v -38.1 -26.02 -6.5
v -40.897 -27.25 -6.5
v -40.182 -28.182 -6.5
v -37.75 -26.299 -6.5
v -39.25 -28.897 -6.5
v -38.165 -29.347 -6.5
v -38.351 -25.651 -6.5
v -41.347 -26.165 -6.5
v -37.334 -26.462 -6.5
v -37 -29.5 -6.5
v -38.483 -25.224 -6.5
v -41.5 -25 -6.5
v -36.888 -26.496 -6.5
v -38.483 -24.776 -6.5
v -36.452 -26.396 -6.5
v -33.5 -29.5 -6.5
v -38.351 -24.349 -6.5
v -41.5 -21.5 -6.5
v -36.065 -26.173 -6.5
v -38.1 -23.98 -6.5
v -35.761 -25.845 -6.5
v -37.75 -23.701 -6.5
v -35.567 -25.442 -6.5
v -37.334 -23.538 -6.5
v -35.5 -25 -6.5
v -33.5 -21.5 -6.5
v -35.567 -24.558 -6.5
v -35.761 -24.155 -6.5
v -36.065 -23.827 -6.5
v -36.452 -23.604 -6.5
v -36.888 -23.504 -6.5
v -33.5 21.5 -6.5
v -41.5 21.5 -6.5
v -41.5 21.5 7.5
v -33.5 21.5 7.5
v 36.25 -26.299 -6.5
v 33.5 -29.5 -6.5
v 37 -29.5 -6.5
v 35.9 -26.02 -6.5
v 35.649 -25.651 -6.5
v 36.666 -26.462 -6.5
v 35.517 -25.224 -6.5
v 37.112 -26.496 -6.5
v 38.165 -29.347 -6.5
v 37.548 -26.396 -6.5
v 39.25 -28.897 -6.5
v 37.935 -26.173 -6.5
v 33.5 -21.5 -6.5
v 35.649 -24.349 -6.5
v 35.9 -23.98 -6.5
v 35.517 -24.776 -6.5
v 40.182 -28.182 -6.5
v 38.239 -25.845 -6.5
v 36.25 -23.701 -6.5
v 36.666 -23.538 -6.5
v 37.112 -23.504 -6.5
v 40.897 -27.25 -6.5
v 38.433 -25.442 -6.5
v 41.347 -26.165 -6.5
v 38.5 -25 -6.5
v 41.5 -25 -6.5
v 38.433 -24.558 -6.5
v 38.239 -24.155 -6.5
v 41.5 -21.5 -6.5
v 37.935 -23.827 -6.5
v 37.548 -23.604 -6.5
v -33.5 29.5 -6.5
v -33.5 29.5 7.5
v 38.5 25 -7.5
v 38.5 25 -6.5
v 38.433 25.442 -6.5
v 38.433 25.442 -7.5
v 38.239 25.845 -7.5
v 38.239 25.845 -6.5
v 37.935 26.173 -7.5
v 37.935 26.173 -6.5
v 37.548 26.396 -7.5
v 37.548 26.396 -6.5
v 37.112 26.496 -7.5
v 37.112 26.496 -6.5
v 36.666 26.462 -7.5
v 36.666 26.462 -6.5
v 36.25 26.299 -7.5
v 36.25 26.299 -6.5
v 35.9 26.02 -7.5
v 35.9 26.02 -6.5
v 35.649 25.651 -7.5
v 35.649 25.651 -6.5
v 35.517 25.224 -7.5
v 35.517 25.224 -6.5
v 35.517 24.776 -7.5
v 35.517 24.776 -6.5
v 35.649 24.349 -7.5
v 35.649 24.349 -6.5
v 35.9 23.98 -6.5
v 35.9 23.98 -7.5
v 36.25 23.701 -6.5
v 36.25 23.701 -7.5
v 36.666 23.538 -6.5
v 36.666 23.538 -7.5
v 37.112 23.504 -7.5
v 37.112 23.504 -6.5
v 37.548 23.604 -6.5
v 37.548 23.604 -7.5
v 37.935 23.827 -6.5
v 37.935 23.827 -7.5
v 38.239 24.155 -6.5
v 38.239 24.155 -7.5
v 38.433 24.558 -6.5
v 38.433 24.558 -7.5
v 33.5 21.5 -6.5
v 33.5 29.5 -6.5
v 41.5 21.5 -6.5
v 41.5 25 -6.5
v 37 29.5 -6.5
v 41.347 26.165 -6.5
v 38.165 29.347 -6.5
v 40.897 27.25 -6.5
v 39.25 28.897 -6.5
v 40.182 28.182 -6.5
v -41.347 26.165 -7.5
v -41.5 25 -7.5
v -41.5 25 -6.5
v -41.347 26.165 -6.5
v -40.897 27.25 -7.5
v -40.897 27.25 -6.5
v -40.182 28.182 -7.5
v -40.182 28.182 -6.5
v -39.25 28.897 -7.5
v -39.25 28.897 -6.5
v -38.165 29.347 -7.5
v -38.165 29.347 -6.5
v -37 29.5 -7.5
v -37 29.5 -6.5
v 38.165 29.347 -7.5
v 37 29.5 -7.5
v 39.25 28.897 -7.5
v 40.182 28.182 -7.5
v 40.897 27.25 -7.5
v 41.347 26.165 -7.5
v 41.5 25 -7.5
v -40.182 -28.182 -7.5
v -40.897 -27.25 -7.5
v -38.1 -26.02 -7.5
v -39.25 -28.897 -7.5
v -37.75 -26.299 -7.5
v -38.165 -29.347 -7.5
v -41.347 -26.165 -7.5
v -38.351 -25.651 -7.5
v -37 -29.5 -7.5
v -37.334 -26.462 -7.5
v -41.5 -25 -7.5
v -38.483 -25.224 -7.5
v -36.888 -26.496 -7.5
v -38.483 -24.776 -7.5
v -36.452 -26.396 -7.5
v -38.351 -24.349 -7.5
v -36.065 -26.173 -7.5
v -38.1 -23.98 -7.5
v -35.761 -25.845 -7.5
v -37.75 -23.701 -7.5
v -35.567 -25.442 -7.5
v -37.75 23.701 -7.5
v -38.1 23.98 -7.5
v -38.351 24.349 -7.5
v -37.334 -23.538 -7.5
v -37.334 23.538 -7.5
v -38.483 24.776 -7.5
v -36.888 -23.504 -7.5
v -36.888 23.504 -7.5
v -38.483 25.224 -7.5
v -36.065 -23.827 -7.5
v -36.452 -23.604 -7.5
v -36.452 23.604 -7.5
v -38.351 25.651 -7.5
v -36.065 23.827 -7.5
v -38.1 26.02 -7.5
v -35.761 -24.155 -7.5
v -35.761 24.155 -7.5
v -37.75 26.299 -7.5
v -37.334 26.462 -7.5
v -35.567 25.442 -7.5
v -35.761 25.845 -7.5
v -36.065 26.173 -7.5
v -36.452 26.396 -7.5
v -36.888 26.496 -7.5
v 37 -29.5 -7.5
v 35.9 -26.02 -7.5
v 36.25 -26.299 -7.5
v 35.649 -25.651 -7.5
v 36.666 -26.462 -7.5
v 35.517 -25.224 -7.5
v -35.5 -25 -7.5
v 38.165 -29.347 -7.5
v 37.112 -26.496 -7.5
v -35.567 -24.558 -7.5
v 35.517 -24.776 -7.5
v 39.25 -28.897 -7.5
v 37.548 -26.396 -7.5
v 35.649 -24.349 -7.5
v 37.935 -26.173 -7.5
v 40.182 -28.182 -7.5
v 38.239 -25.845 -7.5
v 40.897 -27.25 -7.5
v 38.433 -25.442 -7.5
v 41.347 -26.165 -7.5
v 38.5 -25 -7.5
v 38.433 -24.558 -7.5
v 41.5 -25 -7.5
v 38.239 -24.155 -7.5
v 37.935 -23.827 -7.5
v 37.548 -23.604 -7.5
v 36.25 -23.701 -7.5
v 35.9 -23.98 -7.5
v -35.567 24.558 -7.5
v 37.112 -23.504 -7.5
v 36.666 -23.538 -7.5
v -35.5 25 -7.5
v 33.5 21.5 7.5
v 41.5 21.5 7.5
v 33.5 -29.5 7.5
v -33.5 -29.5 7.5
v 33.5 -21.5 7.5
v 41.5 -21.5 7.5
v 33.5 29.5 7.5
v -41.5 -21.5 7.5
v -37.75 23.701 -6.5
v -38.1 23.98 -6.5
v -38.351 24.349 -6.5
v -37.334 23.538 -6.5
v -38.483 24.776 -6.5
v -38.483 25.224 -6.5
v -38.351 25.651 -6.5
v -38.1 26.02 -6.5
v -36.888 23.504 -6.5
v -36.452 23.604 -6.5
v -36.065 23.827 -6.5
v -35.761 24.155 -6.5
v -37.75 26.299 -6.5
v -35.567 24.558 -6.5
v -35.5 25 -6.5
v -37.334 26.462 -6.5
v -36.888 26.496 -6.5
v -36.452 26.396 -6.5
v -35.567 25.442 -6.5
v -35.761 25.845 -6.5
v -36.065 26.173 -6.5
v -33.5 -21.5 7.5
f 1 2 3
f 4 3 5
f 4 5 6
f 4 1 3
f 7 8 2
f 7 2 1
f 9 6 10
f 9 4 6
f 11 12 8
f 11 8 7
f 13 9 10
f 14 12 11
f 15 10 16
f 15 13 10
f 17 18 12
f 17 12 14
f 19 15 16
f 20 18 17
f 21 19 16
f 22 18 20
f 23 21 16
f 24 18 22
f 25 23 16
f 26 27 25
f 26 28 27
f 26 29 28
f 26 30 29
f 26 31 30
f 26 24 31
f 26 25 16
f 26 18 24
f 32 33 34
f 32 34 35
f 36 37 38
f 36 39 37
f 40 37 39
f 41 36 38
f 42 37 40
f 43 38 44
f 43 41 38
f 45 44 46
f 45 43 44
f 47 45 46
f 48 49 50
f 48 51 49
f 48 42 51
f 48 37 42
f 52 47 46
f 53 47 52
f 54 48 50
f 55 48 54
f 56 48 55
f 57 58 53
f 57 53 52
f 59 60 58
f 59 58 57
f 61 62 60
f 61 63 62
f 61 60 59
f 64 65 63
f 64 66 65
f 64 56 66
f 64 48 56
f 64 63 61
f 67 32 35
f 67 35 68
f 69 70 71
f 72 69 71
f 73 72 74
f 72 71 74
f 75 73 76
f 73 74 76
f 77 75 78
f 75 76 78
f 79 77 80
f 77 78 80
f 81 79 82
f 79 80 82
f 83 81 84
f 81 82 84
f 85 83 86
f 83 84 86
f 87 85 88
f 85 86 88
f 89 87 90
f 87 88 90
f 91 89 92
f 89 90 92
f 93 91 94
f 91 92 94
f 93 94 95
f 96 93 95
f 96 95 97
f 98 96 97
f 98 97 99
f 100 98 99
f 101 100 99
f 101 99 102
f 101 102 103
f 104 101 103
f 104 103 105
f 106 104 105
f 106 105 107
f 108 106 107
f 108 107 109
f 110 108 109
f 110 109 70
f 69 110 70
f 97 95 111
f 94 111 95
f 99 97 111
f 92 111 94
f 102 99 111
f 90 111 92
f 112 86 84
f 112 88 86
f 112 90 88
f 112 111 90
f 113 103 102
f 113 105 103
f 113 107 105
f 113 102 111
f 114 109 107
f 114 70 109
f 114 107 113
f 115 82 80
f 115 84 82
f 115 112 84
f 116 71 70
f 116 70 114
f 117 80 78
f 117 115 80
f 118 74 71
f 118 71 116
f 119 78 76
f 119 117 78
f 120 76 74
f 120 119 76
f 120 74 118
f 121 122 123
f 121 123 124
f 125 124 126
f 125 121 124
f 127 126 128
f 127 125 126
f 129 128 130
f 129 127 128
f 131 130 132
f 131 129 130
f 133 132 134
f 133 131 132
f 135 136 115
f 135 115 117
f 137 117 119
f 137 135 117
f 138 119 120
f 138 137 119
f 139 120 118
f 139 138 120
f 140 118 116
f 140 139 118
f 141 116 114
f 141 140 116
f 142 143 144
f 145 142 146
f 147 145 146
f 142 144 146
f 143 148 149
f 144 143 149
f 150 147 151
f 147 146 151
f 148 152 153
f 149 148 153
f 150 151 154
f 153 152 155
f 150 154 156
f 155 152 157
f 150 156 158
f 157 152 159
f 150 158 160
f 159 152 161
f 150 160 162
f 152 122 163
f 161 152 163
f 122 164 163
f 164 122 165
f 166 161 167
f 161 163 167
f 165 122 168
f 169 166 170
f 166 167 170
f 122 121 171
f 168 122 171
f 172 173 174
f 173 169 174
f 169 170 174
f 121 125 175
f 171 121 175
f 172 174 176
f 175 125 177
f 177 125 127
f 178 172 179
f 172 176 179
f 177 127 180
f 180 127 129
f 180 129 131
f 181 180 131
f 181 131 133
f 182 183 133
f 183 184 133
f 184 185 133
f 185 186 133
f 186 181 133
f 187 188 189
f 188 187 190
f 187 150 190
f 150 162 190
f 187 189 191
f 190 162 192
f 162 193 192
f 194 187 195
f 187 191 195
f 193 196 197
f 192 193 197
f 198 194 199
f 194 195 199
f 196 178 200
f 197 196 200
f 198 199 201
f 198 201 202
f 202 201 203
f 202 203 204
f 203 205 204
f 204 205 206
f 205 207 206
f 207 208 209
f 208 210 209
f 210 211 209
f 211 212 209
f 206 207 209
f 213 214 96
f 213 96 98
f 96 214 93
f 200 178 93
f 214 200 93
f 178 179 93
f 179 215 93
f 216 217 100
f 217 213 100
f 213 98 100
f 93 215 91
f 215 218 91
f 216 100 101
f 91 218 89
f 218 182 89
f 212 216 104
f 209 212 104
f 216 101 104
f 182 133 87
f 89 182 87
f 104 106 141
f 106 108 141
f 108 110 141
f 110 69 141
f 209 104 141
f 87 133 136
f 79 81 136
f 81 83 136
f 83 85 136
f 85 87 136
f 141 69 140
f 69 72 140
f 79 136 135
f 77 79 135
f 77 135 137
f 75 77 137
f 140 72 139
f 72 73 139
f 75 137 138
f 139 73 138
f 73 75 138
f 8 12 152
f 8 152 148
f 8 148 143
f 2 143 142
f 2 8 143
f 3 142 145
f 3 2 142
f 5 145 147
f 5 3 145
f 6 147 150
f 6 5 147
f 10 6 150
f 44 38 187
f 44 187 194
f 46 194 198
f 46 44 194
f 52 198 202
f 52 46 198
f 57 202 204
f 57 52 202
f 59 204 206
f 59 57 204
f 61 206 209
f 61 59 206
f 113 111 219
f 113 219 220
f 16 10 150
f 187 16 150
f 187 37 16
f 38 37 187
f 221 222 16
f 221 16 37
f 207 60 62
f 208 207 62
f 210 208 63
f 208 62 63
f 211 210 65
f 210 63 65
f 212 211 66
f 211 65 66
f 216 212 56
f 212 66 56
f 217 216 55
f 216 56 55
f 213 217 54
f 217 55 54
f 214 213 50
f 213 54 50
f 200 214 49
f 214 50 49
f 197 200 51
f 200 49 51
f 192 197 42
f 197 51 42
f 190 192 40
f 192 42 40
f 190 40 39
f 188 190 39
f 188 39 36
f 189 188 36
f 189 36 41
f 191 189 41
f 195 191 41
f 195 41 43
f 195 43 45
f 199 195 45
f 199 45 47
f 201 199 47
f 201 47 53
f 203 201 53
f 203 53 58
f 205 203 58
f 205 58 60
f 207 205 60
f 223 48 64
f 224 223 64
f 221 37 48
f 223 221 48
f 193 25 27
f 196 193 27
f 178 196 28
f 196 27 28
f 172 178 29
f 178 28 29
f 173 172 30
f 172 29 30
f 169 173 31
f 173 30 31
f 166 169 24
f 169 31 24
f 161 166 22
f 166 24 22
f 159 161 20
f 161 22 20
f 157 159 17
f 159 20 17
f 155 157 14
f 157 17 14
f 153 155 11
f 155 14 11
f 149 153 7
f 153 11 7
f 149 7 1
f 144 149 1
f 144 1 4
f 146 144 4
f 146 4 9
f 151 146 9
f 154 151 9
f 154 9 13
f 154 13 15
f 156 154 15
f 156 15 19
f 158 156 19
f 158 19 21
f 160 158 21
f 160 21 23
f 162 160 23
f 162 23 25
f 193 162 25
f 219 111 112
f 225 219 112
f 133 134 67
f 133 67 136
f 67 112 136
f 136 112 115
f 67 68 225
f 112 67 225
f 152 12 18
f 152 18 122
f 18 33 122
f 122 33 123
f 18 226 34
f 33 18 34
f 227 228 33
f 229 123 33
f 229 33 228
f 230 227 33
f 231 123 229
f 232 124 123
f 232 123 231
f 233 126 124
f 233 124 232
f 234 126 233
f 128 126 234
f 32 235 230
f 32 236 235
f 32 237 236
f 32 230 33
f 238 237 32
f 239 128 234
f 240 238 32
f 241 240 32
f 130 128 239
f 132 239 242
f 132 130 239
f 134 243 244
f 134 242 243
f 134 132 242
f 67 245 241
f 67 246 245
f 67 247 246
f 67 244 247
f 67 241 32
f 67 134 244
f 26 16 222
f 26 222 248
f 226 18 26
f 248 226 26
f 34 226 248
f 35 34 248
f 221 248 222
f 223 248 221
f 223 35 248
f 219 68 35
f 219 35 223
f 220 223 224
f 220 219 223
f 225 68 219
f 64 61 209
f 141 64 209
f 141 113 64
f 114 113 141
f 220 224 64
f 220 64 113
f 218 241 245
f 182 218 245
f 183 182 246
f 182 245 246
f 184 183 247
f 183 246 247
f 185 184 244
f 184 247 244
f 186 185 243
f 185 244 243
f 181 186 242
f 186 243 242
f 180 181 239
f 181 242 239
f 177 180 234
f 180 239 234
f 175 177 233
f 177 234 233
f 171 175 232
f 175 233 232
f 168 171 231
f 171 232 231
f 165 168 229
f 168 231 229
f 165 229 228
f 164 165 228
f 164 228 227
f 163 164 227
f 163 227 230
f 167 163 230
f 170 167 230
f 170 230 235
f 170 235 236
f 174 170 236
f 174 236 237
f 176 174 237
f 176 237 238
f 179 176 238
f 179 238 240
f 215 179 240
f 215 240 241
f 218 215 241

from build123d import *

# Parameters (mm, degrees)
F0_W     = 83
F0_H     = 59
F1_DEPTH = 7.5
F2_R     = 1.5
F3_DEPTH = 15.001
F4_R     = 4.5
F5_W     = 8
F5_H     = 8
F6_DEPTH = 14


with BuildPart() as f1:
    # F0 (on Top) → F1 (new body, symmetric)
    with BuildSketch(Plane.XY):
        Rectangle(F0_W, F0_H)
    extrude(amount=F1_DEPTH, both=True)

    # F2 (on face) → F3 (cut, through all)
    with BuildSketch(Plane.XY.offset(7.5)):
        with Locations((-37, 25)):
            Circle(F2_R)
        with Locations((37, 25)):
            Circle(F2_R)
        with Locations((-37, -25)):
            Circle(F2_R)
        with Locations((37, -25)):
            Circle(F2_R)
    extrude(amount=-F3_DEPTH, mode=Mode.SUBTRACT)

    # F4
    f4_edges = [f1.edges().sort_by_distance(p)[0] for p in [
        (-41.5, 29.5, 0),
        (-41.5, -29.5, 0),
        (41.5, -29.5, 0),
        (41.5, 29.5, 0),
    ]]
    fillet(f4_edges, radius=F4_R)

    # F5 (on face) → F6 (cut)
    with BuildSketch(Plane.XY.offset(7.5)):
        with Locations((-37.5, 25.5)):
            Rectangle(F5_W, F5_H)
        with Locations((37.5, 25.5)):
            Rectangle(F5_W, F5_H)
        with Locations((-37.5, -25.5)):
            Rectangle(F5_W, F5_H)
        with Locations((37.5, -25.5)):
            Rectangle(F5_W, F5_H)
    extrude(amount=-F6_DEPTH, mode=Mode.SUBTRACT)


solid = f1.part
